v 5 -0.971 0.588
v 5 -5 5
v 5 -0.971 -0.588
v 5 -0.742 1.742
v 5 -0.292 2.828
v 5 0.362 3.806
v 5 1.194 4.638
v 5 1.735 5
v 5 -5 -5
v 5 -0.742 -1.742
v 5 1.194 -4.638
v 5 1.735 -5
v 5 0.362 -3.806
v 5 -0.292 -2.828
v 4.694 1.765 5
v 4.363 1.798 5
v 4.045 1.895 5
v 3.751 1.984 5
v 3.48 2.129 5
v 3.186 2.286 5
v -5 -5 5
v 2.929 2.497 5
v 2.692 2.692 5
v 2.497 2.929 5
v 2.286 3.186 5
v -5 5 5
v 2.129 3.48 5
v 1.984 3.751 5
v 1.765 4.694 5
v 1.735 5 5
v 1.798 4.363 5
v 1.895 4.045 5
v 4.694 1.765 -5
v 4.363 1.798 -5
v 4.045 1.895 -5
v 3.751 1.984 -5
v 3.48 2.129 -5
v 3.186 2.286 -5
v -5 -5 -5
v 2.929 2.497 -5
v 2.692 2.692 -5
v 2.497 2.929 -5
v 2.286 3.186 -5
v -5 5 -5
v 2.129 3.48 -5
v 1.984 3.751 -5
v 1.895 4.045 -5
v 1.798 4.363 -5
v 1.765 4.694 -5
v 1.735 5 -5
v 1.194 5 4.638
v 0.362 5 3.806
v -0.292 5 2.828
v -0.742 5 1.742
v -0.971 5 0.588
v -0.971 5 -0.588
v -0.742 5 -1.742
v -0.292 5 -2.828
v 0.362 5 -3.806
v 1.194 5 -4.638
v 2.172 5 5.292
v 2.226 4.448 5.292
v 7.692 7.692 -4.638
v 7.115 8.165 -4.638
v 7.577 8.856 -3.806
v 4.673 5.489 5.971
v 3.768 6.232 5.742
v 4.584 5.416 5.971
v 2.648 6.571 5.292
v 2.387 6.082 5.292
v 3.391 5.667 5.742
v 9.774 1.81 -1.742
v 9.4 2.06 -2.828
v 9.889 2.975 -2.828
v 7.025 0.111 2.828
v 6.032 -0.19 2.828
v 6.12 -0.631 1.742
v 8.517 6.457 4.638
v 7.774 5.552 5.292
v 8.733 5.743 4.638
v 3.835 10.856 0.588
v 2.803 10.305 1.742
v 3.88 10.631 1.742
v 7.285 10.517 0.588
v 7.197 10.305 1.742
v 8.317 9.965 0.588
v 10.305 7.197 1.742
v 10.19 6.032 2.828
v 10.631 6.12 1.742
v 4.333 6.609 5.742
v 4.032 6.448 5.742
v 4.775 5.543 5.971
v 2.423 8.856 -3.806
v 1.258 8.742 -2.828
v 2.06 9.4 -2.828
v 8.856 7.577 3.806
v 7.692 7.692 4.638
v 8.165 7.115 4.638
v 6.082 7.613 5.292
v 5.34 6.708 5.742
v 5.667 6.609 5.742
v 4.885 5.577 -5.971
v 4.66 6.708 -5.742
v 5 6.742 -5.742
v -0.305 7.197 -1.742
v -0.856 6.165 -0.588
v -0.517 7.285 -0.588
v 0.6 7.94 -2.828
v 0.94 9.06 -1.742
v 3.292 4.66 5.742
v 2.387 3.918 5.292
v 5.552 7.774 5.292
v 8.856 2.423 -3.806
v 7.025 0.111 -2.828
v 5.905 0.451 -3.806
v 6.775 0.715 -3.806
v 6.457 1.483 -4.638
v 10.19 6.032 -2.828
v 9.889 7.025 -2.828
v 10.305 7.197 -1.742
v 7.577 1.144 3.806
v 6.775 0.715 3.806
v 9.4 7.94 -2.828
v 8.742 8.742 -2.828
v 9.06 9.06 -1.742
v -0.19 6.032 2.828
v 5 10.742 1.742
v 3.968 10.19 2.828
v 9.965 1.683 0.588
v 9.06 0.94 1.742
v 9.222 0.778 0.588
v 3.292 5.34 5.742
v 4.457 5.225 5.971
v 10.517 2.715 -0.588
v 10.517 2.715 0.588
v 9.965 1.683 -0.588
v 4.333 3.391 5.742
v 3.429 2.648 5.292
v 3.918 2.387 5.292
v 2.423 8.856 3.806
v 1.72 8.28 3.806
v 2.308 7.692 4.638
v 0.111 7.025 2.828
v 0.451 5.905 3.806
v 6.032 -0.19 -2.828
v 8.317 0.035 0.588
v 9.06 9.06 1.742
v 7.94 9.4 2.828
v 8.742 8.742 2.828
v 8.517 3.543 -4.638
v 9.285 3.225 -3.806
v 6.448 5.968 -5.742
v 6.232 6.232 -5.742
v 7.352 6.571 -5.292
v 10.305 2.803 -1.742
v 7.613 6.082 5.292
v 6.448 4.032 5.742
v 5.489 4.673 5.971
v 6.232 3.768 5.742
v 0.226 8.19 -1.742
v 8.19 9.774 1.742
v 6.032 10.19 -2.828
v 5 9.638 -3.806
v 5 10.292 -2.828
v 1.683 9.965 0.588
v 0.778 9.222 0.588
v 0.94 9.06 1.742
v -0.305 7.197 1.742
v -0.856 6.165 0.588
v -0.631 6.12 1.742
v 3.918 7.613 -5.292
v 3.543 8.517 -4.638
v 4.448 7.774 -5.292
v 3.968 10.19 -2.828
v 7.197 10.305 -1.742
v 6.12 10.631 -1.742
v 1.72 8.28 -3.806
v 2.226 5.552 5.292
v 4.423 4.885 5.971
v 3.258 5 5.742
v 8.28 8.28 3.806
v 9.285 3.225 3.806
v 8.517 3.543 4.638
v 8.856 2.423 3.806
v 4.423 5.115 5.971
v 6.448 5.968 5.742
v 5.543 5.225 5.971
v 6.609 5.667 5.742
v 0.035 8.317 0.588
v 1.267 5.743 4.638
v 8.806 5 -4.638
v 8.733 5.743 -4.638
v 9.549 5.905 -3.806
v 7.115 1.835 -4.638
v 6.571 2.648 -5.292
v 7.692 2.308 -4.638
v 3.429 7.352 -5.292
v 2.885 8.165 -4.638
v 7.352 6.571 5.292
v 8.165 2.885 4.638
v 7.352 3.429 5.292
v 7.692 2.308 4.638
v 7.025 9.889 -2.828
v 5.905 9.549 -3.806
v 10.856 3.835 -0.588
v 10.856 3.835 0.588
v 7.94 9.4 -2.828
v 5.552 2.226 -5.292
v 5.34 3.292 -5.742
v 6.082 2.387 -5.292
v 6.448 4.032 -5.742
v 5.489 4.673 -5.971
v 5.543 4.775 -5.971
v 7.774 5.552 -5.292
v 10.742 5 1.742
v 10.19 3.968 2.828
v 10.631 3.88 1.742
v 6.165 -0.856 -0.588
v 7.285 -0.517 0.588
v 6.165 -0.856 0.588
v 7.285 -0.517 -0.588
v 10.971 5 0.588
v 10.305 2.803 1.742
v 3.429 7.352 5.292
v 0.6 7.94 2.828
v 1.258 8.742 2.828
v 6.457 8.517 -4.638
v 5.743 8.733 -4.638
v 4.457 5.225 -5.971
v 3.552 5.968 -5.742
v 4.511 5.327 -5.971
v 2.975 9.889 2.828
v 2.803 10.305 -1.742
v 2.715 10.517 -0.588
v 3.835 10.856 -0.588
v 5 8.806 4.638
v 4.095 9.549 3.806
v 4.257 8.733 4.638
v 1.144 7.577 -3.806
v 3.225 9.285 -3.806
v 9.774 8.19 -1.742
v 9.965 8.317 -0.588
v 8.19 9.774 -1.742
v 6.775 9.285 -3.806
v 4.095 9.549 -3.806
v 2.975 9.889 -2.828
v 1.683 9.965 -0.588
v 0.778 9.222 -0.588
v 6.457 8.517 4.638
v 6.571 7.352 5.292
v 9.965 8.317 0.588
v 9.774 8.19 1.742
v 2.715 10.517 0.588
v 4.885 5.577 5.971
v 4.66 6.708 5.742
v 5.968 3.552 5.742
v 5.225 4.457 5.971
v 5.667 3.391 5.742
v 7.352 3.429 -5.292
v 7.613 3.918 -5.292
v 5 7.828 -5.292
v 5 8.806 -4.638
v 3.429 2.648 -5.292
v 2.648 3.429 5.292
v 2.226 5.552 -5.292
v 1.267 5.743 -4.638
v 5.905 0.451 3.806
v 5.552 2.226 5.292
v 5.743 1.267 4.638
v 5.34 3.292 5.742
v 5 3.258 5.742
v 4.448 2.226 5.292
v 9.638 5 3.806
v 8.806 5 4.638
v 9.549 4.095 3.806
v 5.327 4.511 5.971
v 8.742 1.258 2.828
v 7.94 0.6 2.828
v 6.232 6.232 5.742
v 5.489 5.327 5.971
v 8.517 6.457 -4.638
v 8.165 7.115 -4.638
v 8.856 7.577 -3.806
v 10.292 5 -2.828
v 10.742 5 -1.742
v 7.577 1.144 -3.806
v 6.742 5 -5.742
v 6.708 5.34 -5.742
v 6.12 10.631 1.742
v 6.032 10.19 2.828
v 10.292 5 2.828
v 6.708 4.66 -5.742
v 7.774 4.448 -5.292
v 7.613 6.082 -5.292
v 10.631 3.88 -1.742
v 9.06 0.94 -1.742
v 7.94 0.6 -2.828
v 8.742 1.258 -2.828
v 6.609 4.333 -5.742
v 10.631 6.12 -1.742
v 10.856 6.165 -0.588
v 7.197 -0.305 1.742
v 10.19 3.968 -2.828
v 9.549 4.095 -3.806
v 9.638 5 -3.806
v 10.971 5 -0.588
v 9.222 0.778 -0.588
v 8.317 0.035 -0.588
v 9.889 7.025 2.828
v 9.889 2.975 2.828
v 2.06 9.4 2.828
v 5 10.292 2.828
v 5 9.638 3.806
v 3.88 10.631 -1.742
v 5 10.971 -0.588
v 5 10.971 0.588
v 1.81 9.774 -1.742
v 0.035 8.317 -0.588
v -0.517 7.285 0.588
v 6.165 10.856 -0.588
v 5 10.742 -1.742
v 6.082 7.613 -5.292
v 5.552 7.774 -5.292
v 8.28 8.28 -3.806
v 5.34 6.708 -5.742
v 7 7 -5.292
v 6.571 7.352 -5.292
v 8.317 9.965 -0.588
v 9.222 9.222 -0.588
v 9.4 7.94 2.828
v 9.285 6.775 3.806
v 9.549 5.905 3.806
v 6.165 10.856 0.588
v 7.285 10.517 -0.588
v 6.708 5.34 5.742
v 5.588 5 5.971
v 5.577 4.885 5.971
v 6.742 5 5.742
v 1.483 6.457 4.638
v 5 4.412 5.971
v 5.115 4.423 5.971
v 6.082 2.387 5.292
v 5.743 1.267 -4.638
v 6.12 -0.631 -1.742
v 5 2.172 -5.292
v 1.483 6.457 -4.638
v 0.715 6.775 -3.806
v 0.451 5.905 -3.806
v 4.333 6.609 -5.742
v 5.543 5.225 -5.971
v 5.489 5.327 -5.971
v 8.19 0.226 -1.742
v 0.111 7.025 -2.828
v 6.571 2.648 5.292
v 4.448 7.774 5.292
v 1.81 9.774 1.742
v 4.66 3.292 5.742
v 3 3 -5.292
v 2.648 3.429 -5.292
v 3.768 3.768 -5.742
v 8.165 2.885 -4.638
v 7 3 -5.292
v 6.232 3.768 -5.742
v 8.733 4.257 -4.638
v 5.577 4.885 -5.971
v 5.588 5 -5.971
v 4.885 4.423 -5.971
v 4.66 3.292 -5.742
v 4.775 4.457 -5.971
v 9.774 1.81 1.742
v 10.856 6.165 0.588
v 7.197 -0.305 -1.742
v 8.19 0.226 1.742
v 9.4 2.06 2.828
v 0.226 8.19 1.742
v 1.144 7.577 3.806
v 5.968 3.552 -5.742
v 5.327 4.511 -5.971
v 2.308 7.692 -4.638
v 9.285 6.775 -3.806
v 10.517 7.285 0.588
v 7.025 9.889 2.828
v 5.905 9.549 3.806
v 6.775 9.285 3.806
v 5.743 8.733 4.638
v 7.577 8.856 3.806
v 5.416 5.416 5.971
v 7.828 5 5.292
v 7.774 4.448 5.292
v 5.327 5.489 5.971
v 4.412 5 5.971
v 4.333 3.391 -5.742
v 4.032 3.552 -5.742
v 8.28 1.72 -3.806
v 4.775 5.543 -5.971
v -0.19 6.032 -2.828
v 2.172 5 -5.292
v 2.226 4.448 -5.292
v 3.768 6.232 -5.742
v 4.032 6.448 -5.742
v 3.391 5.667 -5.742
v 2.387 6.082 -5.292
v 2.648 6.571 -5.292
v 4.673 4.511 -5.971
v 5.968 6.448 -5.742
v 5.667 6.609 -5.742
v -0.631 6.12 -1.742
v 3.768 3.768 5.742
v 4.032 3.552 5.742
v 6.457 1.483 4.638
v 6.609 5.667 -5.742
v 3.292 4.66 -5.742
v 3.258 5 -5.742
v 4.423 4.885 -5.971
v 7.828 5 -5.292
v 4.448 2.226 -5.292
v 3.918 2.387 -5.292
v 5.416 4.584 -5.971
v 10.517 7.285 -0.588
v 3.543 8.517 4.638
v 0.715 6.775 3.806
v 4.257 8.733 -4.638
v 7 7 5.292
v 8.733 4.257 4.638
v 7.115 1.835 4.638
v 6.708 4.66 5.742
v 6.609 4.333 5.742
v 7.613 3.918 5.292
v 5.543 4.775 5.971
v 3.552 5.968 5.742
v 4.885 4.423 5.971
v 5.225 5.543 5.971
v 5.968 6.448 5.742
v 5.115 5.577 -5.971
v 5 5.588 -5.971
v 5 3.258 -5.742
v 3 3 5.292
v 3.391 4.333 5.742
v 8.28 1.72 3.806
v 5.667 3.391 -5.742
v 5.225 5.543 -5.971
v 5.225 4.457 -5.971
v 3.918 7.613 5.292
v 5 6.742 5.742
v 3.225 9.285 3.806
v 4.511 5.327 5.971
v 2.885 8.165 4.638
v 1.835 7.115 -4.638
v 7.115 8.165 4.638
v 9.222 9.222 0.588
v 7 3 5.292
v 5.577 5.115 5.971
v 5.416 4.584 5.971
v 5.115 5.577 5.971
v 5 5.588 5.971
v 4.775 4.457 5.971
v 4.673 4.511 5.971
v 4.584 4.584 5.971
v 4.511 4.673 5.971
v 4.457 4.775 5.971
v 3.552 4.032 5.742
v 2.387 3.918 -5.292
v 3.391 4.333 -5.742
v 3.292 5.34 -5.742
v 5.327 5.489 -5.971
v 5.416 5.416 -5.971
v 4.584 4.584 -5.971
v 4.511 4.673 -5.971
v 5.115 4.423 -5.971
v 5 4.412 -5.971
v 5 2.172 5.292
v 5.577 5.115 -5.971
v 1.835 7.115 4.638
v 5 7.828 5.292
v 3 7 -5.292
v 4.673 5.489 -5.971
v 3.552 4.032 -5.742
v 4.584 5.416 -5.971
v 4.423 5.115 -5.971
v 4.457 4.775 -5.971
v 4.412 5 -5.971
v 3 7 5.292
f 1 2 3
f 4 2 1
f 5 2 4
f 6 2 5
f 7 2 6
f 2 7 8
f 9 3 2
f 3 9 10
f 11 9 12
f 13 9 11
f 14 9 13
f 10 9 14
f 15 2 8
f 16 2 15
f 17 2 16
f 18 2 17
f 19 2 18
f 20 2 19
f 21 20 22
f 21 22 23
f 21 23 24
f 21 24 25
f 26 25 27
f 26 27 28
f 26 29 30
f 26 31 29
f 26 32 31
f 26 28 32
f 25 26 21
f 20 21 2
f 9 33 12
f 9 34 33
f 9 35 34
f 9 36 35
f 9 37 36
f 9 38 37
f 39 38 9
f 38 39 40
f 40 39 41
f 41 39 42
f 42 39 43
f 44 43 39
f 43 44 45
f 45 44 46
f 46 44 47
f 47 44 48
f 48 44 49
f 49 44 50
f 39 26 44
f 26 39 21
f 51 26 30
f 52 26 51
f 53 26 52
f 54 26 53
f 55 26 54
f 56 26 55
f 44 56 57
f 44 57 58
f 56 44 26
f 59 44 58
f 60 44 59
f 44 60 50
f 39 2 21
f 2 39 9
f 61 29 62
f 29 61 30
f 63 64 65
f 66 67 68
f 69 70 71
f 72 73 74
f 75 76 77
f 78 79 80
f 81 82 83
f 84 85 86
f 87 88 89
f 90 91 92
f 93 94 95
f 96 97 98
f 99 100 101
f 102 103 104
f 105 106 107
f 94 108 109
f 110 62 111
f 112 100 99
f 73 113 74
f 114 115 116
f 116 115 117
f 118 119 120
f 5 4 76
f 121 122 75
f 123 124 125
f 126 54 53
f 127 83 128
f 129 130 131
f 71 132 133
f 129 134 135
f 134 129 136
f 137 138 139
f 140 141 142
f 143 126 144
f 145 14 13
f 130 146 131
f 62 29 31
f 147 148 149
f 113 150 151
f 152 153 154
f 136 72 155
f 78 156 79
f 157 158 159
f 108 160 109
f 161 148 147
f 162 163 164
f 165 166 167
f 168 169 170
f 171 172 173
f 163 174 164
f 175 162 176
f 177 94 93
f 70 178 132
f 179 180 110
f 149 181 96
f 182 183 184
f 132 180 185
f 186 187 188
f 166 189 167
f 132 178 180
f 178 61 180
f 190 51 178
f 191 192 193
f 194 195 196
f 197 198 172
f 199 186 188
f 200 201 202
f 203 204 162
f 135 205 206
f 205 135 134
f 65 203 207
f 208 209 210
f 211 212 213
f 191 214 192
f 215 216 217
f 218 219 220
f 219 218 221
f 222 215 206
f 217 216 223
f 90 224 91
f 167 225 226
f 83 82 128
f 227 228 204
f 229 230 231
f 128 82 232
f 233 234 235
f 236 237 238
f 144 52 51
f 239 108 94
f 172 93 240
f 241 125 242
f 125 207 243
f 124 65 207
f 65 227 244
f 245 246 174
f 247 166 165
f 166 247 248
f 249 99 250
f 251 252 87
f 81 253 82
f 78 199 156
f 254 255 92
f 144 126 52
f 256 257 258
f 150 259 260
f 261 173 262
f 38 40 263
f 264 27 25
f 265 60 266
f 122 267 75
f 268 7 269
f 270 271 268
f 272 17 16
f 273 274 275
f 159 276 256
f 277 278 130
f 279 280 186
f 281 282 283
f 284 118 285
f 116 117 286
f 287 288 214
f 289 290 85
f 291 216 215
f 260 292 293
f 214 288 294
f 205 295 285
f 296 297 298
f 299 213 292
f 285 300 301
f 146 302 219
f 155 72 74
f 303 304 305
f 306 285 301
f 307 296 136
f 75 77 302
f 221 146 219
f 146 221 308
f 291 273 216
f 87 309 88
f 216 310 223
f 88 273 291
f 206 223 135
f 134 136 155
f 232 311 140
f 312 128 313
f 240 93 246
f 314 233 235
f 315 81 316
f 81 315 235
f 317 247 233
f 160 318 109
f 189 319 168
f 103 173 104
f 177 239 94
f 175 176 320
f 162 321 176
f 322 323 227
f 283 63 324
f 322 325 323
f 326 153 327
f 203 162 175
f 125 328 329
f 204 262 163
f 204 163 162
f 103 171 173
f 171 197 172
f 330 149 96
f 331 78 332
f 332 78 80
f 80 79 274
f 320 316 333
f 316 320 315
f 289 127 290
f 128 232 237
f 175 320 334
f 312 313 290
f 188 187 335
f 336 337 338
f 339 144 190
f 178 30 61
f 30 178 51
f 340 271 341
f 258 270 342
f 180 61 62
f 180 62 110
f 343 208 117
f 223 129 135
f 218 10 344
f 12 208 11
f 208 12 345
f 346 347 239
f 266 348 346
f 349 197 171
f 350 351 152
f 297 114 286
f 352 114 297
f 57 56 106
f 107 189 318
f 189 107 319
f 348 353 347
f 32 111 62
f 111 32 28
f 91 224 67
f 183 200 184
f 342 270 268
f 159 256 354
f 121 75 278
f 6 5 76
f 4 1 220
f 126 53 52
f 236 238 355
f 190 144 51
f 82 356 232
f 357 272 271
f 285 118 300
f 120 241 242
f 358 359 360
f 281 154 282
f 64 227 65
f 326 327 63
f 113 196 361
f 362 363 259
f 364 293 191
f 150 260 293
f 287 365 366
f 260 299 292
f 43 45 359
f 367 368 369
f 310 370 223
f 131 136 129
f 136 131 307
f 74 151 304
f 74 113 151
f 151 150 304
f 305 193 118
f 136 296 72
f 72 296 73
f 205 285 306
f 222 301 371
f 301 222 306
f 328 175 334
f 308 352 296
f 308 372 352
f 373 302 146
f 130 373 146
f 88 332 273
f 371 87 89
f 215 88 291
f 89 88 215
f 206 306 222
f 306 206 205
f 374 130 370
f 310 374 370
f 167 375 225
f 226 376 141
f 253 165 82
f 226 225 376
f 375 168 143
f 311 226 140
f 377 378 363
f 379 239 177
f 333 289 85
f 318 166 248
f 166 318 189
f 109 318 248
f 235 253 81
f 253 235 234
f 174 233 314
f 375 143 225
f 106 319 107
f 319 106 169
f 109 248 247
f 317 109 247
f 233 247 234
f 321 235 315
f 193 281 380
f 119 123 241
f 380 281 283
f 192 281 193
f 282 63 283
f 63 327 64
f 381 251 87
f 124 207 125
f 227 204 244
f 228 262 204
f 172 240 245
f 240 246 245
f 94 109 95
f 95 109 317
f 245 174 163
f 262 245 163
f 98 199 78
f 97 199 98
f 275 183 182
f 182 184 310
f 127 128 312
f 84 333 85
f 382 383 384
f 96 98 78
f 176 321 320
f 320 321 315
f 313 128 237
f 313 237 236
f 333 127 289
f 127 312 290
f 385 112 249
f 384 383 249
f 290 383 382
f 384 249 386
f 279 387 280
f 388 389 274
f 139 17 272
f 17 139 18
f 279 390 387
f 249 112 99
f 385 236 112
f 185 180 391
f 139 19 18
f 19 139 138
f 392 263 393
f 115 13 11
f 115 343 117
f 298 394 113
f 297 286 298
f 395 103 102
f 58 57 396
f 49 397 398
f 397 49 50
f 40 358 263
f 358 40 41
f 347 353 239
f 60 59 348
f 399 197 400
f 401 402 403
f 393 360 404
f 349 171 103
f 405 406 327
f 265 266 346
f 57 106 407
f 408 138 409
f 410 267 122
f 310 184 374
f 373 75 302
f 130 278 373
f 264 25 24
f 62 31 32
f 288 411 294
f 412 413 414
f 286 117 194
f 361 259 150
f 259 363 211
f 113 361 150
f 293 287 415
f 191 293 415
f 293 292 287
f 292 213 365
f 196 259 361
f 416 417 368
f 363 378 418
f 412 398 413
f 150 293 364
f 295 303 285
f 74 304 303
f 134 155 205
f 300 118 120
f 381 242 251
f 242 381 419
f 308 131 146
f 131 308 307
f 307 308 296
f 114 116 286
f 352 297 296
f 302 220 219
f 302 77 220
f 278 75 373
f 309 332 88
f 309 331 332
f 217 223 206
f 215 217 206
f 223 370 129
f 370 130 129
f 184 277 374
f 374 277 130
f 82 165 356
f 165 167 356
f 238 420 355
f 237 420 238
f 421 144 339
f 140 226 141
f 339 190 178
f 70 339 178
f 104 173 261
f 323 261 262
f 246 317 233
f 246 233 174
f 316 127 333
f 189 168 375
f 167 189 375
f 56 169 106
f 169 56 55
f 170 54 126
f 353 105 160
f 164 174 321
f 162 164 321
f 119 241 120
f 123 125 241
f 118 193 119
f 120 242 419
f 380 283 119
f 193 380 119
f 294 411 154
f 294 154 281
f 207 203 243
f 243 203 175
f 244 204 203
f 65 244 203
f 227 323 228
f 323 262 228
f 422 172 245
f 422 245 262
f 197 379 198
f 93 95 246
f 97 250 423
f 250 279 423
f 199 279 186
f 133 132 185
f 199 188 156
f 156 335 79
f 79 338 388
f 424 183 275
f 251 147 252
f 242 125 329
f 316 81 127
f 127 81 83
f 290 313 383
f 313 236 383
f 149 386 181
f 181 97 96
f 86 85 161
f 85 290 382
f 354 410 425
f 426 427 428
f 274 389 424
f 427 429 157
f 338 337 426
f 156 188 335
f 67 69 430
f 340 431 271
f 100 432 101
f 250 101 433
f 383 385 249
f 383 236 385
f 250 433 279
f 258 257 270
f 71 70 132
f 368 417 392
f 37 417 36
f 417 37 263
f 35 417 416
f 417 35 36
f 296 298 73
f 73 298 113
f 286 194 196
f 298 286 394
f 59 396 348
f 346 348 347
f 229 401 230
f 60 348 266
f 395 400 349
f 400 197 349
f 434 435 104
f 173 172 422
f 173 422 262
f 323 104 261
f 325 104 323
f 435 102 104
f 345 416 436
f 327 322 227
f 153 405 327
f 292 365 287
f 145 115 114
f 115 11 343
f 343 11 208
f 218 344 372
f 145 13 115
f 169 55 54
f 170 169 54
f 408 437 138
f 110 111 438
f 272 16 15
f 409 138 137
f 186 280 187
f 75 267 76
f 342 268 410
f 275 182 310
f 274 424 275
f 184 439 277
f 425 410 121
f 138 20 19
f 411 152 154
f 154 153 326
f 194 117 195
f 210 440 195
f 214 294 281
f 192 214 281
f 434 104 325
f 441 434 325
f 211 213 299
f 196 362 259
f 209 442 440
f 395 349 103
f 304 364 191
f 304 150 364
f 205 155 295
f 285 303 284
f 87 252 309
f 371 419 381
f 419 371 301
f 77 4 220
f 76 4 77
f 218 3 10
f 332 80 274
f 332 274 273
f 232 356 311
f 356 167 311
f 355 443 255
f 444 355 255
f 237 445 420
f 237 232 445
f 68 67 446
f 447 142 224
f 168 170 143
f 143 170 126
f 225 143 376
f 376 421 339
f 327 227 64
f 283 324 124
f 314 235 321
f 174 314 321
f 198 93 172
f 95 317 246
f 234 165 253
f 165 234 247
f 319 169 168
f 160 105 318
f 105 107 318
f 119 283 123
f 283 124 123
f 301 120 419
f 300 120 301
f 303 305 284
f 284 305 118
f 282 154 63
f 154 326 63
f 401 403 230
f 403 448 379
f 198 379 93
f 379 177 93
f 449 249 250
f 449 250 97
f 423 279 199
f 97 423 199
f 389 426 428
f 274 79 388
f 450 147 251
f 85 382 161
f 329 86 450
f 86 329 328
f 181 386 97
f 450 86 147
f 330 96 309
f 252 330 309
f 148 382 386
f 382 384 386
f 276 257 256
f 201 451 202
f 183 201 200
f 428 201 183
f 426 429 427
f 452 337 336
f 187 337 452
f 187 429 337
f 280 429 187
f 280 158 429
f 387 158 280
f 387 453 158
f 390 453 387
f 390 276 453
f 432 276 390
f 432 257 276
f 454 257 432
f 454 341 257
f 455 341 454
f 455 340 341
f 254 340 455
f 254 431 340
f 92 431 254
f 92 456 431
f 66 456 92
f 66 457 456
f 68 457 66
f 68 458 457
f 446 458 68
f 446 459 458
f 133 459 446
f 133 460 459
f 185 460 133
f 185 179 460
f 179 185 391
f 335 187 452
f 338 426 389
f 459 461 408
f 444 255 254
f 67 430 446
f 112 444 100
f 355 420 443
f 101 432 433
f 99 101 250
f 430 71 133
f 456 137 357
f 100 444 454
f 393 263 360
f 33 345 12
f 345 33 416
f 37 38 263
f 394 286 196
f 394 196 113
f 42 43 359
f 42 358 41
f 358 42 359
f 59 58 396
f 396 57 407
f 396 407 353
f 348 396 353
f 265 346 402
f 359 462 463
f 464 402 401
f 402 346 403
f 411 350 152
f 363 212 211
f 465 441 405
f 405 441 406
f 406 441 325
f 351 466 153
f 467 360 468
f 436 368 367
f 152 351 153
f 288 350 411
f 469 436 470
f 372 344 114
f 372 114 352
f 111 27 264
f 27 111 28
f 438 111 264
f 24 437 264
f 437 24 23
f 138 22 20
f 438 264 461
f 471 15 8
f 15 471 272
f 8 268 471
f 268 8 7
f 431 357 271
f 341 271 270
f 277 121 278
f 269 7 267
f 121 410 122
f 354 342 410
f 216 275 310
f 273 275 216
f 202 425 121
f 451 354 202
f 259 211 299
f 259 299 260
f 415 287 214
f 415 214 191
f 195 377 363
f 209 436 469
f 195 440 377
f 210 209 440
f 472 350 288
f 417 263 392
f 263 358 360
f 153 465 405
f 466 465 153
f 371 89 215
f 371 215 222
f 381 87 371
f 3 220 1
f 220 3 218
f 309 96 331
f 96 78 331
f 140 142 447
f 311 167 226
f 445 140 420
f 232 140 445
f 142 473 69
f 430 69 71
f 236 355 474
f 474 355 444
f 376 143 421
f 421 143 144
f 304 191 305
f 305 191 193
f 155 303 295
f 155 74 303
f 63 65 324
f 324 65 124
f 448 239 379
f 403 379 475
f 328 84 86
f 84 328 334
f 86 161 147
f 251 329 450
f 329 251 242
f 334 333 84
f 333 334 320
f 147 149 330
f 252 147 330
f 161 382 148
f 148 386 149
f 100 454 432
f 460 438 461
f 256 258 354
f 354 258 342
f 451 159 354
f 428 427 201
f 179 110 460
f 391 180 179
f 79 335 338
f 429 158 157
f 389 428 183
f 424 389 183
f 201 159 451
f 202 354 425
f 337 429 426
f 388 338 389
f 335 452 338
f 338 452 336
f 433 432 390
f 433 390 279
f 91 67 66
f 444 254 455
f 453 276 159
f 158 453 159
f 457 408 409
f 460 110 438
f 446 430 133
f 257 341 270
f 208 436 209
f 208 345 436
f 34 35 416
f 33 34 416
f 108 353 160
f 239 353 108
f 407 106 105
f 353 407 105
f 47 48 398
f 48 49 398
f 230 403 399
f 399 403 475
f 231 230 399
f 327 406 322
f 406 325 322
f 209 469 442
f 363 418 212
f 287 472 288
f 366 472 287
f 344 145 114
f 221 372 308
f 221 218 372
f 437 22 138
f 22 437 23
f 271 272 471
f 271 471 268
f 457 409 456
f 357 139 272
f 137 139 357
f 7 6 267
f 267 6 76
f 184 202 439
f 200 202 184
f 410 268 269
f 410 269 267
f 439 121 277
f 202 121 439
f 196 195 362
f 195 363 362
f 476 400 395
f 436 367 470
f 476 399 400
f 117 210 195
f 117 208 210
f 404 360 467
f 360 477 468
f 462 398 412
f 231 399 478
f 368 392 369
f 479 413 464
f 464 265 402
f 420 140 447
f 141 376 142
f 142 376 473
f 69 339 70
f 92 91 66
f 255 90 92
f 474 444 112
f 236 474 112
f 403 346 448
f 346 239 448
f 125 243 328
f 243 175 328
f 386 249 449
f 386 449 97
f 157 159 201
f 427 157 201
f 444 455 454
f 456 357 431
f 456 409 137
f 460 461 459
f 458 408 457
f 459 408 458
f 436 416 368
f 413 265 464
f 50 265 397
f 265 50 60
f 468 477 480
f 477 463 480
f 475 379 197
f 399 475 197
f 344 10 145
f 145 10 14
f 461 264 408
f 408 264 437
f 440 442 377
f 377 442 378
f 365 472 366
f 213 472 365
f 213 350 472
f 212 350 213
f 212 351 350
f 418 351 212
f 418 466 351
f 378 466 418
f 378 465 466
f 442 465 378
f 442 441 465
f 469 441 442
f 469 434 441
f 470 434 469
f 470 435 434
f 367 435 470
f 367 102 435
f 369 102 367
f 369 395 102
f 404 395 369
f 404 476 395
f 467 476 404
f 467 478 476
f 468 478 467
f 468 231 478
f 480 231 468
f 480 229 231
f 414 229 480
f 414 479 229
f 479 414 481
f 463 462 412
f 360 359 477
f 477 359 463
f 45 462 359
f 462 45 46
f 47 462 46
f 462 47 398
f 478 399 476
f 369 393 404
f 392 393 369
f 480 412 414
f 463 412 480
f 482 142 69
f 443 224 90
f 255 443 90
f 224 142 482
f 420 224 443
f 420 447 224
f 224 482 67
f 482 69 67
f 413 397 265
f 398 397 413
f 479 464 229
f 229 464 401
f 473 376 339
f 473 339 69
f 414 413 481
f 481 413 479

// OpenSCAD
// Construct: union() of two overlapping solids.
union() {
    cube(10, center = true);
    translate([5, 5, 0]) sphere(r = 6, $fn = 32);
}
